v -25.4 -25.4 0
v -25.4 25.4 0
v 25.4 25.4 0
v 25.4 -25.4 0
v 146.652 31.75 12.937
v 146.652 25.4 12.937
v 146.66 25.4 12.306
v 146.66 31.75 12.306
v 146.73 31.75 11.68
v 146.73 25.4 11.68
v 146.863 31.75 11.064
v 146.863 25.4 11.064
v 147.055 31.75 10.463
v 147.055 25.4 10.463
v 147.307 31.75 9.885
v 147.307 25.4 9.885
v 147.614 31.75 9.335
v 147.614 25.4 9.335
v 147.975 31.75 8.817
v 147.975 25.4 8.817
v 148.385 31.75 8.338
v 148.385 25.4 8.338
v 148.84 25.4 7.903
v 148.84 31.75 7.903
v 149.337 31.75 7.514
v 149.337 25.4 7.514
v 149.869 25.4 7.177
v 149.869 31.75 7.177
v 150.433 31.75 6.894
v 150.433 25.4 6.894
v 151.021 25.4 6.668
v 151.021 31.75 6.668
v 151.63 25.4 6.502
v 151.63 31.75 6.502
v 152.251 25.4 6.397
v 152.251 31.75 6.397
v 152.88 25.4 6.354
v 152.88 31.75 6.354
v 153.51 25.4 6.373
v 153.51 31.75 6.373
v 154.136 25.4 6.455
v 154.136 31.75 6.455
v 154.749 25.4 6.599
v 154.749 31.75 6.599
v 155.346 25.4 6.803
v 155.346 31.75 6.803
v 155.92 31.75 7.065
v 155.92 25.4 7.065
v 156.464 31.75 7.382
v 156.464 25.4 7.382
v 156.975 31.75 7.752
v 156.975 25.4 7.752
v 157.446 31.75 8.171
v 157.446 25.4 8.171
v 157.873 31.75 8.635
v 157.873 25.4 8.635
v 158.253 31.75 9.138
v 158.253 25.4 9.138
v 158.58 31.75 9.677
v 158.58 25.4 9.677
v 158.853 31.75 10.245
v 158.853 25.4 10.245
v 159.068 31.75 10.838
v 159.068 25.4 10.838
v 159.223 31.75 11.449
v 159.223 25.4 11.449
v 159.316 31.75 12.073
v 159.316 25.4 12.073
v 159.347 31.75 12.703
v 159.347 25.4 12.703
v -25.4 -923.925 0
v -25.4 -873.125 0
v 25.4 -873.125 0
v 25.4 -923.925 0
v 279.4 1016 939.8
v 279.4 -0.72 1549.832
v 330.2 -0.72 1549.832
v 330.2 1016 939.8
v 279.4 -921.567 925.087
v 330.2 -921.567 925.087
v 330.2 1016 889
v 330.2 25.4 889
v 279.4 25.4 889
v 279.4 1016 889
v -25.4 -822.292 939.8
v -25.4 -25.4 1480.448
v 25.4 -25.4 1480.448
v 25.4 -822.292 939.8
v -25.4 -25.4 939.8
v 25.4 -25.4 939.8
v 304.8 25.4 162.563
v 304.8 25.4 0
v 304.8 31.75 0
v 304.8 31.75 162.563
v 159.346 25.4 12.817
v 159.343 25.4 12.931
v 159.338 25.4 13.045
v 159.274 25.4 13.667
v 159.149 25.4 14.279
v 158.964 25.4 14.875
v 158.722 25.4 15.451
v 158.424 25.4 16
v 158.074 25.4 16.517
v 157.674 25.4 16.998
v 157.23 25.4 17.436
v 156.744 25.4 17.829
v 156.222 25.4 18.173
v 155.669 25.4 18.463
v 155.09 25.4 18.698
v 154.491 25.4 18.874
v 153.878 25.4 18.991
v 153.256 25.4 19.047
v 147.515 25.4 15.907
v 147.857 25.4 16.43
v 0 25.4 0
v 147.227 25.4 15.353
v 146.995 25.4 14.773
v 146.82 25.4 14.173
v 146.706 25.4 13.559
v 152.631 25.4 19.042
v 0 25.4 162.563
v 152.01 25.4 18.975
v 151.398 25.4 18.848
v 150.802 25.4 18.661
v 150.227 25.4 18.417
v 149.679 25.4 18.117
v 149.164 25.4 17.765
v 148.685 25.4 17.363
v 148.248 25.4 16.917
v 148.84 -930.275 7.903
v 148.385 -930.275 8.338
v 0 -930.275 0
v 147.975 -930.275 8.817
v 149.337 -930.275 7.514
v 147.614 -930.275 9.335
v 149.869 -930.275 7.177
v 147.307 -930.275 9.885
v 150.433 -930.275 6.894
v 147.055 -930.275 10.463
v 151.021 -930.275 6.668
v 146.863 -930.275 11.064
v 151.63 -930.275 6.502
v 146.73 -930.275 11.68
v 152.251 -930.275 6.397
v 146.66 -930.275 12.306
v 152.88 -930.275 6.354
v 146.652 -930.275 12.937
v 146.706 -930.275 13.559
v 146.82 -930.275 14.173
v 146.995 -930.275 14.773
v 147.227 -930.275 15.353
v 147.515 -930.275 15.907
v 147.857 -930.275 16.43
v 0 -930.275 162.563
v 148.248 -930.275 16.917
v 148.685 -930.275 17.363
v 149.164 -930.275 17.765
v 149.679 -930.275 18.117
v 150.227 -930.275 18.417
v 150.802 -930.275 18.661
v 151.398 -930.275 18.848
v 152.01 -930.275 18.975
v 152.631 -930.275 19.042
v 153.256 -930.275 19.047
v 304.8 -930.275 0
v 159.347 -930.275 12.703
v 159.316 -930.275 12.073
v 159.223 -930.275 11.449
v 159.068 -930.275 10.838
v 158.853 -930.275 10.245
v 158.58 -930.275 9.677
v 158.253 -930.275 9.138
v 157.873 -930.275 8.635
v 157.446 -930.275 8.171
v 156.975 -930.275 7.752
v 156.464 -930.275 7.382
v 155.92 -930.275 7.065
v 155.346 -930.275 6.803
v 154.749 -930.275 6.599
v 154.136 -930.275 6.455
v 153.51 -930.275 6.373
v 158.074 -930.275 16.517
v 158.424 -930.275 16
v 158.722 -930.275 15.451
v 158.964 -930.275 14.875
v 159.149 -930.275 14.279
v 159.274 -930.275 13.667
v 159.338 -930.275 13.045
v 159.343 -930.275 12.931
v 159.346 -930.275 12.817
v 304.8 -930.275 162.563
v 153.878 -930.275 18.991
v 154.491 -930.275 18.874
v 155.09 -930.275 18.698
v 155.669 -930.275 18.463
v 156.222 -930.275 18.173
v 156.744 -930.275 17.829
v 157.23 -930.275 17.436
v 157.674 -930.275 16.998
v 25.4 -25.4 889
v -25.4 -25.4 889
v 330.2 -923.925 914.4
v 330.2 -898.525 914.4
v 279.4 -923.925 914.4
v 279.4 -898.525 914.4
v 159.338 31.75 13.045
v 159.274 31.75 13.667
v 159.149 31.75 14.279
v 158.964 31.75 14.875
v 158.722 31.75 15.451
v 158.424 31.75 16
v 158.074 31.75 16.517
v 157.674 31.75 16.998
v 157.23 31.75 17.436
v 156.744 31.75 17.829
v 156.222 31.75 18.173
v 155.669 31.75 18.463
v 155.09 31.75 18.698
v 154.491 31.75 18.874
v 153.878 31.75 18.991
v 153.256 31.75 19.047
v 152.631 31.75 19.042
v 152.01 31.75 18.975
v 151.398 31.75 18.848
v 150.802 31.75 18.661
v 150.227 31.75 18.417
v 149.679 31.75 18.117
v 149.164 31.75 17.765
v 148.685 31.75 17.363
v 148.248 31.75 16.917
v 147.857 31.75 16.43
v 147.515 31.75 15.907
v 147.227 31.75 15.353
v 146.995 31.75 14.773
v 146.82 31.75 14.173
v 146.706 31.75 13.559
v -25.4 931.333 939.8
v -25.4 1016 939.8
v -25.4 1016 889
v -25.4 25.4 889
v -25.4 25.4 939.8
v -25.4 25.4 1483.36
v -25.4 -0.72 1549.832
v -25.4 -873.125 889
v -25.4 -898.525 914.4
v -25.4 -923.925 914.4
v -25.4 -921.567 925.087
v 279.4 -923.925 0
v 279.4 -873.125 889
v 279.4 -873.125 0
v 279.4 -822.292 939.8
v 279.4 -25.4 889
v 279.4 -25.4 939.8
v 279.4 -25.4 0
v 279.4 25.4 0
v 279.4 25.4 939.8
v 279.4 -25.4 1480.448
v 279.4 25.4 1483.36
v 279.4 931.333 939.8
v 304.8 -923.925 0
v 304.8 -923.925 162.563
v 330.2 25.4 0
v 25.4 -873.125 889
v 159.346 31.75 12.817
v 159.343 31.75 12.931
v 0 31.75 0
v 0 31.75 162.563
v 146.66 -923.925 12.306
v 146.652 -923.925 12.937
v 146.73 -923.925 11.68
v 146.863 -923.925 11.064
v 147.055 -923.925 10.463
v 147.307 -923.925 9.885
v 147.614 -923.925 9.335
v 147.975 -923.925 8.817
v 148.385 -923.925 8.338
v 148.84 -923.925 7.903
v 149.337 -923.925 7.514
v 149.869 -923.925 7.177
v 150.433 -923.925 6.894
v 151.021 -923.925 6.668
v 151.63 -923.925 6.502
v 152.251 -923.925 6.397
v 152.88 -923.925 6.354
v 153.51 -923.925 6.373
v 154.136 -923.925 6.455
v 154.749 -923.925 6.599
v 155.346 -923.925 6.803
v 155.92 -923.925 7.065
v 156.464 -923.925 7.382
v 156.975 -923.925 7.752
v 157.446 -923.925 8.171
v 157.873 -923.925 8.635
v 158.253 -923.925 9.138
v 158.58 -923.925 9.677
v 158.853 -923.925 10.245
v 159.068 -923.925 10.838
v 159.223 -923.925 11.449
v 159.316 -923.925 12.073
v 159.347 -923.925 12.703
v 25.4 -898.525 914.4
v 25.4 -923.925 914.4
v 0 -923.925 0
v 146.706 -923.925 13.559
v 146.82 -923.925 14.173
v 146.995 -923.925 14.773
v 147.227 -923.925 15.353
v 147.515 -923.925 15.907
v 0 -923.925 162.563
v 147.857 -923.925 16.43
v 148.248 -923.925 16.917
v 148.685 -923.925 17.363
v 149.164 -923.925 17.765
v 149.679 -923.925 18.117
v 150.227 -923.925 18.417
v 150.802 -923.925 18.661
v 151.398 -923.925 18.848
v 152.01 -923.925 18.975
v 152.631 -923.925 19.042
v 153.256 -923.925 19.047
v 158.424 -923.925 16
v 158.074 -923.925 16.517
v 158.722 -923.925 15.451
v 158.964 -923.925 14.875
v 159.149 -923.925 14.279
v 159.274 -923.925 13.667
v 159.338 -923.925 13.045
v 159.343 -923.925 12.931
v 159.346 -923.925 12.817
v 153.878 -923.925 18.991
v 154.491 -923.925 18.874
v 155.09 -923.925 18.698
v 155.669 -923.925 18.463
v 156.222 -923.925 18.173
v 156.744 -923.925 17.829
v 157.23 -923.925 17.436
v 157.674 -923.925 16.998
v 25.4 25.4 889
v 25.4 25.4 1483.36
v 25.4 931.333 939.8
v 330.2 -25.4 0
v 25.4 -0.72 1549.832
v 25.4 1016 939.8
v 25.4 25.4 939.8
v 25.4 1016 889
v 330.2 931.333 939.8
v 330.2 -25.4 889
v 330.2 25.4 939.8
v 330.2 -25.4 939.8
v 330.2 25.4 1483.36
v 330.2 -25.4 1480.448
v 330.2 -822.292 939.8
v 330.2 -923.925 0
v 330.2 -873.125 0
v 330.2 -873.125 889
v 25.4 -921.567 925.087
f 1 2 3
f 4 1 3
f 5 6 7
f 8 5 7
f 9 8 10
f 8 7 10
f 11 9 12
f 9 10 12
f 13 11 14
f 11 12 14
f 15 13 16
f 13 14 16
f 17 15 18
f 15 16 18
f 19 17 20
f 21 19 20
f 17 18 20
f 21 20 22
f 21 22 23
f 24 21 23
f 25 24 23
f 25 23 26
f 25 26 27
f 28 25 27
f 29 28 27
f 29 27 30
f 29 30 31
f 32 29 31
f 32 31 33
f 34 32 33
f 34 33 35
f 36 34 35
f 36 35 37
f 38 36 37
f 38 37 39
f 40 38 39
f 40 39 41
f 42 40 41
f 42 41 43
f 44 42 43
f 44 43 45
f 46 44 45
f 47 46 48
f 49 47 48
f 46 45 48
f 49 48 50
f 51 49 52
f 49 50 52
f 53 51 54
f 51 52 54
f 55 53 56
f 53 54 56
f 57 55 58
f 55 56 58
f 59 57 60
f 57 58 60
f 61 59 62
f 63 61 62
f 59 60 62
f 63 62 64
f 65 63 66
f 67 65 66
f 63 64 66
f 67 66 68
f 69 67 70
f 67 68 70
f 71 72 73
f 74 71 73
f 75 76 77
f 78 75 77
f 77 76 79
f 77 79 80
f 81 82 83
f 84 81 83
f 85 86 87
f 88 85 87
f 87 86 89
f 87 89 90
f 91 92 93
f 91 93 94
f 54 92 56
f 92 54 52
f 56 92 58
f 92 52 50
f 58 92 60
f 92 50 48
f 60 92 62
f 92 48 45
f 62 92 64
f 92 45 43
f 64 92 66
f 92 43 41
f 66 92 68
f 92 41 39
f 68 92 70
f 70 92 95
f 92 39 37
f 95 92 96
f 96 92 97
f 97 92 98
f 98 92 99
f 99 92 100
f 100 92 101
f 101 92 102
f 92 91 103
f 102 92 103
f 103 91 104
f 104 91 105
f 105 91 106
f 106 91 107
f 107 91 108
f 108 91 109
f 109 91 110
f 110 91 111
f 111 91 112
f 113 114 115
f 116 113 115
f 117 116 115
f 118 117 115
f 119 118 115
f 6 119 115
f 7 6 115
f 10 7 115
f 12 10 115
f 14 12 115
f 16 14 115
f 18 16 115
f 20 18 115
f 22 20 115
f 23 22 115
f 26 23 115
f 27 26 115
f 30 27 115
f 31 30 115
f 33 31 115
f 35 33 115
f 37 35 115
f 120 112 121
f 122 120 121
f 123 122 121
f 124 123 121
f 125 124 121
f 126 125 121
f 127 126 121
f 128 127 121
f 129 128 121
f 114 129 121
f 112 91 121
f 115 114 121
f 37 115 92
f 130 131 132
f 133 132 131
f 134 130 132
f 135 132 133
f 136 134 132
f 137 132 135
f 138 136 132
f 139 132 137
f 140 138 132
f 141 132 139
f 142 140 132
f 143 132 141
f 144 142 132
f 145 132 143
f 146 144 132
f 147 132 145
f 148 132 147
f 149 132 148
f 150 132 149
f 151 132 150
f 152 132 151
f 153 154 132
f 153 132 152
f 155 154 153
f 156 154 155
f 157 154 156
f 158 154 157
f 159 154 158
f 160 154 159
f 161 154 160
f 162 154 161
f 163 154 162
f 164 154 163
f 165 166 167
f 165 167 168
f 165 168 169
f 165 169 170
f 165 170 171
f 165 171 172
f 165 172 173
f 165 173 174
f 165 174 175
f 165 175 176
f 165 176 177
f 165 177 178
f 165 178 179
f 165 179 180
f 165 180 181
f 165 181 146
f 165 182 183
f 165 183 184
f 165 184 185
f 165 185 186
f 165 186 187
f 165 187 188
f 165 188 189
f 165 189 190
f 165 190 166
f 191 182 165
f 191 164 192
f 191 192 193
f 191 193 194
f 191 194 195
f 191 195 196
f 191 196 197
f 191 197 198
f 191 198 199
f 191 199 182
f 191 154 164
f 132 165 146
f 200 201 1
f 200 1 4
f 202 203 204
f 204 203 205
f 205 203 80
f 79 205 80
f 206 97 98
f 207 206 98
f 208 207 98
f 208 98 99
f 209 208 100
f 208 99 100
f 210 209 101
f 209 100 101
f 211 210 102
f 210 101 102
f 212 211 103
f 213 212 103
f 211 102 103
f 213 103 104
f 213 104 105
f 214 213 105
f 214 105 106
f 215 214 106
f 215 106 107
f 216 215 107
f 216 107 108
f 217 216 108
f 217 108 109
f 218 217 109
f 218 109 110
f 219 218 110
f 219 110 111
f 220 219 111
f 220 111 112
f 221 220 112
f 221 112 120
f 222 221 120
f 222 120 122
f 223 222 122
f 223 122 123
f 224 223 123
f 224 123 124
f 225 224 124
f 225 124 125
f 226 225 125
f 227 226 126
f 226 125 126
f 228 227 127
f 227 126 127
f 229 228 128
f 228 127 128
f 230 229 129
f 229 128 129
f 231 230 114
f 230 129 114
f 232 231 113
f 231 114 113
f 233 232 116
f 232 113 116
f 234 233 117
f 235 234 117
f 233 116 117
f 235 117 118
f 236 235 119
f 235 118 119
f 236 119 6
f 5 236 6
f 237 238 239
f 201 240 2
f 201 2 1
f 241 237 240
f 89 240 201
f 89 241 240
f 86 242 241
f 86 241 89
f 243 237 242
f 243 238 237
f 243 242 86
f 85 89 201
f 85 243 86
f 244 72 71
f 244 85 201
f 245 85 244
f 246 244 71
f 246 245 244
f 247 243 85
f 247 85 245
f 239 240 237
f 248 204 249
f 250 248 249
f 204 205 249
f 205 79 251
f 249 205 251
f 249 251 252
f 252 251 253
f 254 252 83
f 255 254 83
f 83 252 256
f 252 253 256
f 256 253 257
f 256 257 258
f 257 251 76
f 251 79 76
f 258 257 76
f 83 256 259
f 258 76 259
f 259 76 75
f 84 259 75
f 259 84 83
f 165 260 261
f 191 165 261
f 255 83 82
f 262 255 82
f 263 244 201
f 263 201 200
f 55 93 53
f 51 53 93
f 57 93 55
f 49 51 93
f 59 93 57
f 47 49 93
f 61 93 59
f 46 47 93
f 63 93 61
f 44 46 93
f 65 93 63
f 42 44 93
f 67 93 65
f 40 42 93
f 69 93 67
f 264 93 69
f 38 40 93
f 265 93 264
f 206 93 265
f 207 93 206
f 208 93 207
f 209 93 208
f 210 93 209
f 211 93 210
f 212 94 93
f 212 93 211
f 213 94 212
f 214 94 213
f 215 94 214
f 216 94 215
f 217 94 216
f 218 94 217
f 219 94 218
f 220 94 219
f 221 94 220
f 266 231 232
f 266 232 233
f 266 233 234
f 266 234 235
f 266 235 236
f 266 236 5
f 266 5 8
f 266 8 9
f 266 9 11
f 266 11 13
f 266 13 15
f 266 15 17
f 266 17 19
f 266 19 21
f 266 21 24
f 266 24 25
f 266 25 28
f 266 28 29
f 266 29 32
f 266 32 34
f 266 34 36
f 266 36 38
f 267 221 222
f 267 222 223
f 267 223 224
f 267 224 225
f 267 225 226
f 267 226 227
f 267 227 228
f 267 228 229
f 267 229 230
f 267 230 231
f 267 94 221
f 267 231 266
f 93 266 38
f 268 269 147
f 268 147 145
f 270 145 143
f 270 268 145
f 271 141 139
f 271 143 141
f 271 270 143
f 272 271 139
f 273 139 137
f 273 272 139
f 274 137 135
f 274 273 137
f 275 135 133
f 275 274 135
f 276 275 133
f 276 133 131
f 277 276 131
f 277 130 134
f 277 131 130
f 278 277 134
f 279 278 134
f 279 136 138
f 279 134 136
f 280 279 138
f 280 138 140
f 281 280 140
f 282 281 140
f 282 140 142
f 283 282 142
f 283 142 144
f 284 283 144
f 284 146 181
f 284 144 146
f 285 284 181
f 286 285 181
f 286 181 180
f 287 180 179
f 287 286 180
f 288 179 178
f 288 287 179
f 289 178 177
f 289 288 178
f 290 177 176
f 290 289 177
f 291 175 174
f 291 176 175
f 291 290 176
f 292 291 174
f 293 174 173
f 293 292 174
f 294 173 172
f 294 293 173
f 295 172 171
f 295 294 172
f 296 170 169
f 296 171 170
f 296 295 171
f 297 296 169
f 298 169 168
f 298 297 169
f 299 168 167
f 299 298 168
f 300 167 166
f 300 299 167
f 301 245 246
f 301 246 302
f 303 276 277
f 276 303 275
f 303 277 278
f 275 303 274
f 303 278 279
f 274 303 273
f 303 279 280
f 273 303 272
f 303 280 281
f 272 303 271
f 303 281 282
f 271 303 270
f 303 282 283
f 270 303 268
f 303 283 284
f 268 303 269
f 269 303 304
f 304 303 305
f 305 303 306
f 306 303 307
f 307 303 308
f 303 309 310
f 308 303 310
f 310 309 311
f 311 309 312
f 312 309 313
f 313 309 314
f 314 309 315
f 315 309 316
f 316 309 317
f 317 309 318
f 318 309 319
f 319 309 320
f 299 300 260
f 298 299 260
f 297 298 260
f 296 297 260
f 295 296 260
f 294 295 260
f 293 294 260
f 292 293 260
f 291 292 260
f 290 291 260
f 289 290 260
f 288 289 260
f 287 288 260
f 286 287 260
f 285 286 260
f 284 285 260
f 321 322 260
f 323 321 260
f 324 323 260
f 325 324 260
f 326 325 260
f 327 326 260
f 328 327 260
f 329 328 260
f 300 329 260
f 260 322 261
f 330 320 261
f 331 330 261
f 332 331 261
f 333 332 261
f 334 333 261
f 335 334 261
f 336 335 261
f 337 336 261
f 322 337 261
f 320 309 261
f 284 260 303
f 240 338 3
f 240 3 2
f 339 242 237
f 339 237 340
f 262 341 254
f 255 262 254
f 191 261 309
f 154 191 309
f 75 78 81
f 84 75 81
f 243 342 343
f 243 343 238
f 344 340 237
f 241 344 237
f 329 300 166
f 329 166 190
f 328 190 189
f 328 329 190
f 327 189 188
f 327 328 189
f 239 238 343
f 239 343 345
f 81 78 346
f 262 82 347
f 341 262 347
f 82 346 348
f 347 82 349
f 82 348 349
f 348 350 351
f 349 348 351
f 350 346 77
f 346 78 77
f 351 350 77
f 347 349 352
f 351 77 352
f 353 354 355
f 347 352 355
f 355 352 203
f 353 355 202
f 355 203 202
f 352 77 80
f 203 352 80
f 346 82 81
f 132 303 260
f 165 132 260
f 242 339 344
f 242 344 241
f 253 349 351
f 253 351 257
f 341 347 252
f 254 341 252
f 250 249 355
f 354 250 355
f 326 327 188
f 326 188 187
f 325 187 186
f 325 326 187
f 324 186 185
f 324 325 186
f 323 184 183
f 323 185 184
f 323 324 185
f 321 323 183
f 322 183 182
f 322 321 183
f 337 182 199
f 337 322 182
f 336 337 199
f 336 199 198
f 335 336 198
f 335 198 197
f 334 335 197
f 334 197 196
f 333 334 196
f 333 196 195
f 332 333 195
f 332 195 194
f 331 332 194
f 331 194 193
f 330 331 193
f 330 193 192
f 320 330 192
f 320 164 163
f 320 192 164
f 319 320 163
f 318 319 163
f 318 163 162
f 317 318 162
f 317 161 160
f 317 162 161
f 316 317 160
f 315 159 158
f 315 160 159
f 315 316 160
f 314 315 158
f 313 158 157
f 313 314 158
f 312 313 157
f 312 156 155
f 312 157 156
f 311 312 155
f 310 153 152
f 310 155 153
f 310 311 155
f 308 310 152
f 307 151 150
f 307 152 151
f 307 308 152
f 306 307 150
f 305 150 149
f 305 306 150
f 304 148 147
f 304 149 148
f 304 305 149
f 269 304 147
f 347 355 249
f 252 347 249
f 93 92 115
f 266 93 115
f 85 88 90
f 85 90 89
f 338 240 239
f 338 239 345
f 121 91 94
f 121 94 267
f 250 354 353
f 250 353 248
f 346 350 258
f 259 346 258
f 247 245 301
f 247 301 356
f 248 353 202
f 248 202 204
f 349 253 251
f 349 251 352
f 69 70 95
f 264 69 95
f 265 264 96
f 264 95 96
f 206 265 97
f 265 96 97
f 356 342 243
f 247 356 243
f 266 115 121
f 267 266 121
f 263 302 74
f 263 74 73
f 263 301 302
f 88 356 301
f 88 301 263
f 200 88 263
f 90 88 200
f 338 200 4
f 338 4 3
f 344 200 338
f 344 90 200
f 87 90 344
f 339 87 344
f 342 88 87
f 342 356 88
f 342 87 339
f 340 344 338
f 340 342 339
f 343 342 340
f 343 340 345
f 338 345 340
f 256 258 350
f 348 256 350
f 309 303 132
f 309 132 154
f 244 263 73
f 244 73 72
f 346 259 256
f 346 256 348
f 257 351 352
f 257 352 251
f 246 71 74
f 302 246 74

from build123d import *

# Parameters (mm, degrees)
F1_W           = 50.8
F1_H           = 50.8
F4_W           = 50.8
F4_H           = 50.8
F7_W           = 50.8
F7_H           = 50.8
F11_W          = 279.4
F11_H          = 162.5629514456
F11_W_2        = 25.4
F12_DEPTH      = 6.35
F13_W          = 304.8
F13_H          = 162.5629514456
F14_DEPTH      = 6.35
F18_DEPTH      = 930.276
F18_DEPTH_BACK = 1016.001


with BuildPart() as f2:
    # F2: sweep along a path in F0
    with BuildLine(Plane.YZ) as f2_path:
        Line((0, 0), (0, 914.4))
        Line((0, 914.4), (0, 1524))
    # F1 (on Top) → F2 (sweep)
    with BuildSketch(Plane.XY):
        Rectangle(F1_W, F1_H)
    sweep(path=f2_path.line)

    # F5: sweep along a path in F0
    with BuildLine(Plane.YZ) as f5_path:
        Line((1016, 914.4), (0, 914.4))
        Line((0, 914.4), (-898.525, 914.4))
    # F4 (on plane+point) → F5 (sweep)
    with BuildSketch(Plane.XZ.offset(-1016)):
        with Locations((0, 914.4)):
            Rectangle(F4_W, F4_H)
    sweep(path=f5_path.line)

    # F6: sweep along a path in F0
    with BuildLine(Plane.YZ) as f6_path:
        Line((1016, 914.4), (0, 1524))
        Line((0, 1524), (-898.525, 914.4))
    # F4 (on plane+point) → F6 (sweep)
    with BuildSketch(Plane.XZ.offset(-1016)):
        with Locations((0, 914.4)):
            Rectangle(F4_W, F4_H)
    sweep(path=f6_path.line, transition=Transition.RIGHT)

    # F8: sweep along a path in F0
    with BuildLine(Plane.YZ) as f8_path:
        Line((-898.525, 0), (-898.525, 914.4))
    # F7 (on Top) → F8 (sweep)
    with BuildSketch(Plane.XY):
        with Locations((0, -898.525)):
            Rectangle(F7_W, F7_H)
    sweep(path=f8_path.line)


with BuildPart() as f10_1:
    # F10: instance of F2
    add(f2.part.mirror(Plane.YZ.offset(152.4)))


with BuildPart() as f12:
    # F11 (on face) → F12 (new body)
    with BuildSketch(Plane.XZ.offset(923.925)):
        with Locations((139.7, 81.2814757228)):
            Rectangle(F11_W, F11_H)
        with Locations((292.1, 81.2814757228)):
            Rectangle(F11_W_2, F11_H)
    extrude(amount=F12_DEPTH)


with BuildPart() as f14:
    # F13 (on face) → F14 (new body)
    with BuildSketch(Plane(origin=(0, 25.4, 0), x_dir=(-1, 0, 0), z_dir=(0, 1, 0))):
        with Locations((-152.4, 81.2814757228)):
            Rectangle(F13_W, F13_H)
    extrude(amount=F14_DEPTH)


with BuildPart() as f18_tool:
    # F17 (on Front) → F18 (new body, two sides)
    with BuildSketch(Plane.XZ) as f18_sk:
        with BuildLine():
            ThreePointArc((159.3381964918, 13.0454395062), (152.9431460914, 19.0523229376), (146.6517872176, 12.9369225662))
            ThreePointArc((146.6517872176, 12.9369225662), (152.9974607006, 12.7025552313), (159.3381964918, 13.0454395062))
        make_face()
        with BuildLine():
            ThreePointArc((159.3381964918, 13.0454395062), (152.9974607006, 12.7025552313), (146.6517872176, 12.9369225662))
            ThreePointArc((146.6517872176, 12.9369225662), (152.8802570675, 6.3536369527), (159.3474607006, 12.7025552313))
            ThreePointArc((159.3474607006, 12.7025552313), (159.3451442259, 12.8740599335), (159.3381964918, 13.0454395062))
        make_face()
    extrude(amount=F18_DEPTH)
    extrude(f18_sk.sketch, amount=-F18_DEPTH_BACK)


with BuildPart() as f12_1:
    add(f12.part)

    # F18: cut by f18_tool
    add(f18_tool.part, mode=Mode.SUBTRACT)


with BuildPart() as f14_1:
    add(f14.part)

    # F18: cut by f18_tool
    add(f18_tool.part, mode=Mode.SUBTRACT)


solid = Compound([f2.part, f10_1.part, f12_1.part, f14_1.part])
